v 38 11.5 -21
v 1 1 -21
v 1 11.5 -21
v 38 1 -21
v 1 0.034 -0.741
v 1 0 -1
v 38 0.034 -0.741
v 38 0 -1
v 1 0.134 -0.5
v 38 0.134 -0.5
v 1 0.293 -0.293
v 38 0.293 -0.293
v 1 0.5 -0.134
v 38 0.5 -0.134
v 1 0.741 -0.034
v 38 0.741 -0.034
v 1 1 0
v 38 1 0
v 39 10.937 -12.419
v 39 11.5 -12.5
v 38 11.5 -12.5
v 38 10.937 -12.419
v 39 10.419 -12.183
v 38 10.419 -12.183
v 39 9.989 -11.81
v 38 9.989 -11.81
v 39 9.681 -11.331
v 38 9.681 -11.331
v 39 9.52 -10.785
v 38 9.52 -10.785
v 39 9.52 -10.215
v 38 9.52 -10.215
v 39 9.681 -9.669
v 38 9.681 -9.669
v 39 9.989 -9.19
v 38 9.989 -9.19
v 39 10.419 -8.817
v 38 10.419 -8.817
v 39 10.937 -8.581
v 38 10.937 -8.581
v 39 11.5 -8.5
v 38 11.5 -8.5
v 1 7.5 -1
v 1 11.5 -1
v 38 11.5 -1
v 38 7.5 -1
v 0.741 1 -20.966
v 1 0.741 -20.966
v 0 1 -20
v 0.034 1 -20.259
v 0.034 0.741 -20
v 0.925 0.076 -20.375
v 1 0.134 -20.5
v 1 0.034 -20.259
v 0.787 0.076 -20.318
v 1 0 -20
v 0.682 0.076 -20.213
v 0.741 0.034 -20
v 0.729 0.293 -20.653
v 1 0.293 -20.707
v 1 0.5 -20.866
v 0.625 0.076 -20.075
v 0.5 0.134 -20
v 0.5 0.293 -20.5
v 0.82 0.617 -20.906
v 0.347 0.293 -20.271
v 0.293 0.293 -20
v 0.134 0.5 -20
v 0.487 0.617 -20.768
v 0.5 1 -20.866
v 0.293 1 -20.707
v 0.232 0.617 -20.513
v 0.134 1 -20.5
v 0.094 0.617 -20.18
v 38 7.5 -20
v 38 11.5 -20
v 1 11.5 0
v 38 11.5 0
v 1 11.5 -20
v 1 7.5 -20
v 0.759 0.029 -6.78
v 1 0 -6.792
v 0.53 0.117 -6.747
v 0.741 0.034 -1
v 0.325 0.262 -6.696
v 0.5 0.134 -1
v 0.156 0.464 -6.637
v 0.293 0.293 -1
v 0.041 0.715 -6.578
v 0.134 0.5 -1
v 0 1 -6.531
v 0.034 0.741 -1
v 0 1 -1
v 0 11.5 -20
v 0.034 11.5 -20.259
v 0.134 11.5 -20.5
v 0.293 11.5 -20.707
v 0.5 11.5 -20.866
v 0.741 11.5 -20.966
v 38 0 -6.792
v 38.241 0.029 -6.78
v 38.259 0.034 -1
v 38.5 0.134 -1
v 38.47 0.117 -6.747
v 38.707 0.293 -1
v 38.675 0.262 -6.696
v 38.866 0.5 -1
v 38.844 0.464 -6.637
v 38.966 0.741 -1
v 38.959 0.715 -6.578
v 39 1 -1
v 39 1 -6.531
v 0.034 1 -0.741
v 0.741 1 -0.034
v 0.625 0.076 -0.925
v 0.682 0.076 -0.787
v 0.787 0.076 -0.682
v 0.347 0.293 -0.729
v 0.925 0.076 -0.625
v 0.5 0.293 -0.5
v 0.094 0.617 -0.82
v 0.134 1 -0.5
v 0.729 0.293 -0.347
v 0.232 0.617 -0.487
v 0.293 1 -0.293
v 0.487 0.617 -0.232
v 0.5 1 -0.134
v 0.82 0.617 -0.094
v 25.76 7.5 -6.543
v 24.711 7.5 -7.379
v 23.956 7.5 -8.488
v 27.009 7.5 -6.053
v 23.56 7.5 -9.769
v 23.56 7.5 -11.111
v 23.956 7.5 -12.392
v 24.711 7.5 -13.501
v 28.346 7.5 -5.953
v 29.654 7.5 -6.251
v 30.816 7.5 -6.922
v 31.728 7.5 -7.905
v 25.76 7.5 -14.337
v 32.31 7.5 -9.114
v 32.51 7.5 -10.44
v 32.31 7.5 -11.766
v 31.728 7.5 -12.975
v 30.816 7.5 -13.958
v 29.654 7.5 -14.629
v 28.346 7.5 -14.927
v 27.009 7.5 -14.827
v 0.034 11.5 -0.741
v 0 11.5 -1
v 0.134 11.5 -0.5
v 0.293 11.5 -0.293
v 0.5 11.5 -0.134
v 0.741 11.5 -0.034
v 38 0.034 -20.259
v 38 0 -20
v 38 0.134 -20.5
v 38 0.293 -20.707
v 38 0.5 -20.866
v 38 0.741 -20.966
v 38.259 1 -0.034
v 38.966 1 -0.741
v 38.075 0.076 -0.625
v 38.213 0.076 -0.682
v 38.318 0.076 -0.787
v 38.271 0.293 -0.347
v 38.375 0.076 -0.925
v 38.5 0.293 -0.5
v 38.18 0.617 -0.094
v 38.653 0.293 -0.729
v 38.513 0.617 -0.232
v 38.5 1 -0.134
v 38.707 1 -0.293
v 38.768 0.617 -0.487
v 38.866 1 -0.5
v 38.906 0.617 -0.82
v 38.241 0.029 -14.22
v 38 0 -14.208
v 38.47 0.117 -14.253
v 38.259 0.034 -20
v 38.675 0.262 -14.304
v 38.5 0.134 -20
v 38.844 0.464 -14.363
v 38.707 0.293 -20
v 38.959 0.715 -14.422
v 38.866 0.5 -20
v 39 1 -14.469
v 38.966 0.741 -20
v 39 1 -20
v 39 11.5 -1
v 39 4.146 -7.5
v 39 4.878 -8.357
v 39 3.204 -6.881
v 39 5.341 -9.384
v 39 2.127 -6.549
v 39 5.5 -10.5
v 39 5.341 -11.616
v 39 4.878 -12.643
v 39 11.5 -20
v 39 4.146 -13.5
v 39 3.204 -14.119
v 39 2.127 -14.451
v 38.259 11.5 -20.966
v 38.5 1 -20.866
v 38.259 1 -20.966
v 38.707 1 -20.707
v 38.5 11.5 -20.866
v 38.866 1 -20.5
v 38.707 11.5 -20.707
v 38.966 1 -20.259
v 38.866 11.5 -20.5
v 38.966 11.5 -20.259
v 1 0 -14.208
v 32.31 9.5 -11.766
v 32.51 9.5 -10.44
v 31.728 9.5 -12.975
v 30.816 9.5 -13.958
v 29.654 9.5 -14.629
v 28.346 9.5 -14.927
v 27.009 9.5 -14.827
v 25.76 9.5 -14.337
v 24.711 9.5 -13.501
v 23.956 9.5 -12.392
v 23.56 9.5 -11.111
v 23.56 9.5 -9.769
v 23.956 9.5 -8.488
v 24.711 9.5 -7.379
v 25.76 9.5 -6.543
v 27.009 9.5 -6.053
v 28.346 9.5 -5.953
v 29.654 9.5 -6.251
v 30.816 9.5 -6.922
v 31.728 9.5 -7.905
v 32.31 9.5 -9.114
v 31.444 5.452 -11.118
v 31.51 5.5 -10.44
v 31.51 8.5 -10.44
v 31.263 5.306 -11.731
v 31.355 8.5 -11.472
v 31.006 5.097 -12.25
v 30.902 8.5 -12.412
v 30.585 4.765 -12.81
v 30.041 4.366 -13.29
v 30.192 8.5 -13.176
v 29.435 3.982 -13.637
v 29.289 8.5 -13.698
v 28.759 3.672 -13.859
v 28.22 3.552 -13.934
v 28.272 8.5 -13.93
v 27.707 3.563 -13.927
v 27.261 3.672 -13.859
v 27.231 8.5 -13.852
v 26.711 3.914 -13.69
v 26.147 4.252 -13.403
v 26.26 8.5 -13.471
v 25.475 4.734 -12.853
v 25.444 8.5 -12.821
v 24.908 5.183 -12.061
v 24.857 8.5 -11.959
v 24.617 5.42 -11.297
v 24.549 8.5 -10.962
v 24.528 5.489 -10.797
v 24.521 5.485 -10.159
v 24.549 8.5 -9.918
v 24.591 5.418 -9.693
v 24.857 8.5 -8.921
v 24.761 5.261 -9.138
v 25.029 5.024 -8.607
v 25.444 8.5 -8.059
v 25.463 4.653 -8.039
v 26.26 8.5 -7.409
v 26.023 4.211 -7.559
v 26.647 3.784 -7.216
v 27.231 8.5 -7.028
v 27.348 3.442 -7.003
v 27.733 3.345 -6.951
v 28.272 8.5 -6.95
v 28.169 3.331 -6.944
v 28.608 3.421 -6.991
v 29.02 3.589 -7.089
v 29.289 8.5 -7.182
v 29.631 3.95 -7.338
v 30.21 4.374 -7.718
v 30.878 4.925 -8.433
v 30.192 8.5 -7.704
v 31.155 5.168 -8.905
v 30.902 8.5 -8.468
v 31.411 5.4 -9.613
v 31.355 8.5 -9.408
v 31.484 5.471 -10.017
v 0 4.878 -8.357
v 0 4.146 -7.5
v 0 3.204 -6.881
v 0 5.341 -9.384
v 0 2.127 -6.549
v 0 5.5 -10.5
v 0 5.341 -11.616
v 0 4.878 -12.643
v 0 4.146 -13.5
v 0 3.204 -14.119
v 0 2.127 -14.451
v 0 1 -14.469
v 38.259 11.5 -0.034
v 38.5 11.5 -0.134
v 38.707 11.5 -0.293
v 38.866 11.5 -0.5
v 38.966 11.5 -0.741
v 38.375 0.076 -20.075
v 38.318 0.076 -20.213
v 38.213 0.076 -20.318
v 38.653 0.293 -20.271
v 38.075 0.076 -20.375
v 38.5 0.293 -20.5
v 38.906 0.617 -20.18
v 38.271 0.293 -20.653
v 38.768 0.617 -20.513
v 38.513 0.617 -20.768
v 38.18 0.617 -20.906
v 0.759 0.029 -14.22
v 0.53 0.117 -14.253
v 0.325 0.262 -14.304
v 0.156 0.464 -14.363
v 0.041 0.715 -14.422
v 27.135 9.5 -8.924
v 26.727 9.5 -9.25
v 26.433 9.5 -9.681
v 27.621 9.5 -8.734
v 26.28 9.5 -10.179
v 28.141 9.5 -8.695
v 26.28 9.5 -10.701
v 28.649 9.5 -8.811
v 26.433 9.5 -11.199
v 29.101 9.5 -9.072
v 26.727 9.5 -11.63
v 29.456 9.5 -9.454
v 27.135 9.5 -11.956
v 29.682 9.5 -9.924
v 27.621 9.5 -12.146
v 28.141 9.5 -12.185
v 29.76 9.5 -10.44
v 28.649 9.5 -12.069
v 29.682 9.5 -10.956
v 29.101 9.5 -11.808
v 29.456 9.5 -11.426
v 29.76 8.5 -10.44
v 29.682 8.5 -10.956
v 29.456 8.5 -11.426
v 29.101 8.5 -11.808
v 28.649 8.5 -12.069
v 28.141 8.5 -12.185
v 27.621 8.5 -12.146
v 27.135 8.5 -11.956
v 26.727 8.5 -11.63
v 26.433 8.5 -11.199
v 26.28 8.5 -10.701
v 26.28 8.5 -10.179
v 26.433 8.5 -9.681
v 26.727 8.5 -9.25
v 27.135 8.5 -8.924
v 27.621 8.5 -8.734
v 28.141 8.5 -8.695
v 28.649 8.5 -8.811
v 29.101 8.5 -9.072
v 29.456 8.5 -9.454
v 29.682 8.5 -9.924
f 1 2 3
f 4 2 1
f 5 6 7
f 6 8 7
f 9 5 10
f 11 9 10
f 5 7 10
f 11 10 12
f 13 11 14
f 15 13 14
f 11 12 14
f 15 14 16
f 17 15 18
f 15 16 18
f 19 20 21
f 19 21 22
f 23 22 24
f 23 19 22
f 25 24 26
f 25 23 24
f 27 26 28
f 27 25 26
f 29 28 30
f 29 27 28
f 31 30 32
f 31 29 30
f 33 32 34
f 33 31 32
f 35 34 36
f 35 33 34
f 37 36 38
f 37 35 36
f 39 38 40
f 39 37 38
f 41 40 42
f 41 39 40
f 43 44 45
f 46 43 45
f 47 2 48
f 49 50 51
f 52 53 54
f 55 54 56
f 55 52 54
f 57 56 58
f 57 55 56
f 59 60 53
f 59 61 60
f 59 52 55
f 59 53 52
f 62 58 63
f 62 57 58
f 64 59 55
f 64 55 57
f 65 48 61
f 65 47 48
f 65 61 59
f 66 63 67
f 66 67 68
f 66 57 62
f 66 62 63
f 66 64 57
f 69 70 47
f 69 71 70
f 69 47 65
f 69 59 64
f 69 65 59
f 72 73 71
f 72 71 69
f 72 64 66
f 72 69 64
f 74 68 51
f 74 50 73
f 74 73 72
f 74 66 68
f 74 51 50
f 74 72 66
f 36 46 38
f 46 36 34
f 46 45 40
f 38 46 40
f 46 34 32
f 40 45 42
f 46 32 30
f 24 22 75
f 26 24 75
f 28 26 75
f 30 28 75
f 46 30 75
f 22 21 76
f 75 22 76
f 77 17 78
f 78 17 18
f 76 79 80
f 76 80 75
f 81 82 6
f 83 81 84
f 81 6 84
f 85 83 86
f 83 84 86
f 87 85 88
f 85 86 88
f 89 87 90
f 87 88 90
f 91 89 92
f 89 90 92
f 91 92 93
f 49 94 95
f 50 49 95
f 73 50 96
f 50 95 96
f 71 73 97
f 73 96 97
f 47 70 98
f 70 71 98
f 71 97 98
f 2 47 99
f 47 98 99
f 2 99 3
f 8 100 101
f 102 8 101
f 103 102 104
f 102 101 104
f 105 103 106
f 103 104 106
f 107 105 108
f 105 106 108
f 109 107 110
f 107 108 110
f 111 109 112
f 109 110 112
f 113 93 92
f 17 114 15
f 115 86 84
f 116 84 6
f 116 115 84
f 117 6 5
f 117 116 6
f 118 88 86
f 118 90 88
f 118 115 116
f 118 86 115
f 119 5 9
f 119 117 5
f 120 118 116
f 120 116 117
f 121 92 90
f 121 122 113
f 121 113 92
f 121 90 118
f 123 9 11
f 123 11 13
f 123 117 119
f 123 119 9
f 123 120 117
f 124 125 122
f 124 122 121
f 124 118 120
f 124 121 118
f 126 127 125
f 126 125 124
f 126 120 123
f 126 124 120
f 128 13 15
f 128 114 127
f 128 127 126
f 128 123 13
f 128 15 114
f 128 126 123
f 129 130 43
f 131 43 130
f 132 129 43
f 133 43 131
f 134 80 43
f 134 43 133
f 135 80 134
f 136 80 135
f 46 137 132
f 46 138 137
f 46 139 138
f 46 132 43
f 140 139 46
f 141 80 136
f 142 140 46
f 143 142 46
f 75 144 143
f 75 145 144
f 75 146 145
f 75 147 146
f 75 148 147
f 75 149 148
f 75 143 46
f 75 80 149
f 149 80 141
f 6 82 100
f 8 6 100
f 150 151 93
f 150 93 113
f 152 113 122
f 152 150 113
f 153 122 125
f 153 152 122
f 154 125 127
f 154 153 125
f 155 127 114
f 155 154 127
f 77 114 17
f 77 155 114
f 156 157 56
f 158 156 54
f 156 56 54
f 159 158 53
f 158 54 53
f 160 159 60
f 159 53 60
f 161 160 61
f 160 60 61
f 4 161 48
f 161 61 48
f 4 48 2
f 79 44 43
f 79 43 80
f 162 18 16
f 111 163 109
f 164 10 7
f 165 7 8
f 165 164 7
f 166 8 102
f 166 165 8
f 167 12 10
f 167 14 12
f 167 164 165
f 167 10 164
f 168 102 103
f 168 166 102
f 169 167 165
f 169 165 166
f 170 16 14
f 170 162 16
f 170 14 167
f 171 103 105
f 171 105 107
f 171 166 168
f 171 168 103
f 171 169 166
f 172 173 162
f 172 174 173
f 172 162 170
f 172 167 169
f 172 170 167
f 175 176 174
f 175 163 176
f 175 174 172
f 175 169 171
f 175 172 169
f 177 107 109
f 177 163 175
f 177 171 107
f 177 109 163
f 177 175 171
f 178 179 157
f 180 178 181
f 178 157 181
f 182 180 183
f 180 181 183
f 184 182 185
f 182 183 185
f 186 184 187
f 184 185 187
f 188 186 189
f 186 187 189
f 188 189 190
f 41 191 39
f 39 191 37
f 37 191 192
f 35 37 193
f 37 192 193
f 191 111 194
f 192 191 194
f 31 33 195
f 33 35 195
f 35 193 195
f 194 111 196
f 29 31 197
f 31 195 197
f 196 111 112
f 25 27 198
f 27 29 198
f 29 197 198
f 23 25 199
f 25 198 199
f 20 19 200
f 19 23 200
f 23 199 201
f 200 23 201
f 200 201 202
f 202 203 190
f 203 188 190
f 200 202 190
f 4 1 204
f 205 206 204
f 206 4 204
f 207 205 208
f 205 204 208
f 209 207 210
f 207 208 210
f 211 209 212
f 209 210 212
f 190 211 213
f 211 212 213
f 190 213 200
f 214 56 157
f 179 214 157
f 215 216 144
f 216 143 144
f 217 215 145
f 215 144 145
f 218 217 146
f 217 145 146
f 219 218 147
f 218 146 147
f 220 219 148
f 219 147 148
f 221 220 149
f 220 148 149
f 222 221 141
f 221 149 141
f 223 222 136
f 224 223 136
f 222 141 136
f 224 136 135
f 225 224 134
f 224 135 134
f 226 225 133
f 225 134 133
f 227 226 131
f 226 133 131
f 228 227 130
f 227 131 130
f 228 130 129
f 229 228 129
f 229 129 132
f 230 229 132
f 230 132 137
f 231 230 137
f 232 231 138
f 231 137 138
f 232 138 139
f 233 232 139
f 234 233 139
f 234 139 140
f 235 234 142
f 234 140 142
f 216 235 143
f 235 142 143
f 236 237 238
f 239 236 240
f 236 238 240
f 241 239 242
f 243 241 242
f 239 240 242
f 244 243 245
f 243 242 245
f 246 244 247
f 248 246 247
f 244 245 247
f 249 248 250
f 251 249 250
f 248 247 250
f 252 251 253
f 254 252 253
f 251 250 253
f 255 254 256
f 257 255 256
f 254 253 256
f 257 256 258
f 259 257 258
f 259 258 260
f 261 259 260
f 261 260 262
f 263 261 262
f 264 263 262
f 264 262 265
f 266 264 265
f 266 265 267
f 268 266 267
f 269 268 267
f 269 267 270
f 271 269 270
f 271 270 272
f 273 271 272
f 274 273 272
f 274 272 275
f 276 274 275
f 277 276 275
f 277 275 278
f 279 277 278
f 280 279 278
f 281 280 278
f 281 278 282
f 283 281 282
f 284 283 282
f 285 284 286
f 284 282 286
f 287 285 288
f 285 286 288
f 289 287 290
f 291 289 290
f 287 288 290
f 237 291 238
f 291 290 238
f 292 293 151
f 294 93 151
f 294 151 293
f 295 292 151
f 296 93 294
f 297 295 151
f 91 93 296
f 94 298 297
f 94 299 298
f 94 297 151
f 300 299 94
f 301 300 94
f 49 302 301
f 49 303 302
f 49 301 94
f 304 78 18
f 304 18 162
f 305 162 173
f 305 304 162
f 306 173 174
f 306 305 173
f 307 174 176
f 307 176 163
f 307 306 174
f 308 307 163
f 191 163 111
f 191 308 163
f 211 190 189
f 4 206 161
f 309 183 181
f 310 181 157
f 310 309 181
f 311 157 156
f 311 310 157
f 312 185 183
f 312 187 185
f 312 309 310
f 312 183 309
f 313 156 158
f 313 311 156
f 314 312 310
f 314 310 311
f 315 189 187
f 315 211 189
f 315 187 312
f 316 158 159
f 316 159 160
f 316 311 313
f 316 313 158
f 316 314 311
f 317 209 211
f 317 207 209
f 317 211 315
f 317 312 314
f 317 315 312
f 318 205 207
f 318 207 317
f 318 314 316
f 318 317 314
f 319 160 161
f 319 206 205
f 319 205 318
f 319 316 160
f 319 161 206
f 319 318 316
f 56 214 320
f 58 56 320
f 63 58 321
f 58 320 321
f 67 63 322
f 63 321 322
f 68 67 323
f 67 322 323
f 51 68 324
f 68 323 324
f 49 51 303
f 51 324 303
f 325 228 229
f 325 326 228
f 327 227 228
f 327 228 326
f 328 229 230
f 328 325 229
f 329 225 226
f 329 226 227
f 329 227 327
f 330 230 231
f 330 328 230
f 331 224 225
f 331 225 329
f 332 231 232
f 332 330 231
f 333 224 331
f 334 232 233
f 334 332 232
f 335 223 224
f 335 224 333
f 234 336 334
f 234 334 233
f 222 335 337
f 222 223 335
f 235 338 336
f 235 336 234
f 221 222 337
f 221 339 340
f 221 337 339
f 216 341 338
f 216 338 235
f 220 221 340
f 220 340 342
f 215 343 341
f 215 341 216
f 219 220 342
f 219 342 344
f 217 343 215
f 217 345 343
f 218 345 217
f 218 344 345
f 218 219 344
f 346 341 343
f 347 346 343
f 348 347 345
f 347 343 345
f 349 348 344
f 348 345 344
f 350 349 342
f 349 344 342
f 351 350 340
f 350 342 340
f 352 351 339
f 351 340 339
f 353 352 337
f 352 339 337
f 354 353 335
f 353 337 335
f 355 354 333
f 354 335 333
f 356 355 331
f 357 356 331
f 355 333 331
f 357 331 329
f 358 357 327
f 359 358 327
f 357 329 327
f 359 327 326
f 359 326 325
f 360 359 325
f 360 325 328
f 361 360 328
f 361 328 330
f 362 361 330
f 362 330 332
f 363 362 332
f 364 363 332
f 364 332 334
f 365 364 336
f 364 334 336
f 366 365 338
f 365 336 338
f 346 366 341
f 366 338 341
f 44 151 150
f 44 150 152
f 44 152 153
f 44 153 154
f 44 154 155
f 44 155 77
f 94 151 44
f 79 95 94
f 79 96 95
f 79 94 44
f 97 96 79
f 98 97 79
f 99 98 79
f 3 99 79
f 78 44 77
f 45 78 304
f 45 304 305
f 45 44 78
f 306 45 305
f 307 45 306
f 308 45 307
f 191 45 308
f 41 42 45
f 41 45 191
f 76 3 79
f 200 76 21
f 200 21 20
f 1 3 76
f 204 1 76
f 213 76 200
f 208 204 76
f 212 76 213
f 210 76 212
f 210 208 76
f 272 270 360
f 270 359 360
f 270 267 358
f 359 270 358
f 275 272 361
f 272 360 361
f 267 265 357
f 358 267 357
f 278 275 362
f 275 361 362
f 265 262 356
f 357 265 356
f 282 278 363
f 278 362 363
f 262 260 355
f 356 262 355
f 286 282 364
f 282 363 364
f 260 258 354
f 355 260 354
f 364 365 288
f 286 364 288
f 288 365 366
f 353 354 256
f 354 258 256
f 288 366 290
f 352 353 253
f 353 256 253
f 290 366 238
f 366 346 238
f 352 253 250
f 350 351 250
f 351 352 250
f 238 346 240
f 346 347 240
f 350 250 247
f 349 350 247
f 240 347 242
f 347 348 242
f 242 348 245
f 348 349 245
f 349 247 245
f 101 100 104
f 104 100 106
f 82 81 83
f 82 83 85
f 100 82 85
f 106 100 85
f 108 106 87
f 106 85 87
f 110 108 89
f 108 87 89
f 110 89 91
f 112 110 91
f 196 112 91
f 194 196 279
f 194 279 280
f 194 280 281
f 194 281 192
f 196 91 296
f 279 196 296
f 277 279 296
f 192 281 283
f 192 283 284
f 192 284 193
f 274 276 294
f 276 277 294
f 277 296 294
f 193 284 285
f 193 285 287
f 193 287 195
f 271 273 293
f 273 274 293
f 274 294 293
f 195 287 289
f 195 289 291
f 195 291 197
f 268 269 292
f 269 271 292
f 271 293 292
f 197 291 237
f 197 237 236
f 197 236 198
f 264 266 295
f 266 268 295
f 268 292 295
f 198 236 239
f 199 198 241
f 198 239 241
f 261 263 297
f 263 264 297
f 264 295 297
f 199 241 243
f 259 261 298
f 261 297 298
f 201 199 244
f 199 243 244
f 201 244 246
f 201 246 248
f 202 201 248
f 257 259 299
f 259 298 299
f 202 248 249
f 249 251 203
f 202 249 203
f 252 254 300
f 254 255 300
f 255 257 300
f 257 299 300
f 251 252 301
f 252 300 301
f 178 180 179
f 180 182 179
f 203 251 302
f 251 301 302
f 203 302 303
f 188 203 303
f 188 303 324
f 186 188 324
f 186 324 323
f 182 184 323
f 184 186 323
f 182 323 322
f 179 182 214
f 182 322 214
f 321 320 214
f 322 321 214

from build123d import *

# Parameters (mm, degrees)
SKETCH1_W           = 39
SKETCH1_H           = 21
BOSS_EXTRUDE1_DEPTH = 11.5
SKETCH3_W           = 37
SKETCH3_H           = 19
CUT_EXTRUDE2_DEPTH  = 4
FILLET1_R           = 1
FILLET2_R           = 1
SKETCH5_R           = 4.5
BOSS_EXTRUDE2_DEPTH = 2
SKETCH6_R           = 3.5
CUT_EXTRUDE4_DEPTH  = 9.5
SKETCH7_R           = 4.5
BOSS_EXTRUDE3_DEPTH = 1
SKETCH8_R           = 1.75
CUT_EXTRUDE5_DEPTH  = 1
CUT_EXTRUDE6_DEPTH  = 1
CUT_EXTRUDE7_DEPTH  = 39


with BuildPart() as part:
    # Sketch1 → Boss-Extrude1 (new body)
    with BuildSketch(Plane(origin=(0, 0, 0), x_dir=(1, 0, 0), z_dir=(0, 1, 0))):
        with Locations((19.5, 10.5)):
            Rectangle(SKETCH1_W, SKETCH1_H)
    extrude(amount=BOSS_EXTRUDE1_DEPTH)

    # Sketch3 → Cut-Extrude2 (cut)
    with BuildSketch(Plane(origin=(0, 11.5, 0), x_dir=(1, 0, 0), z_dir=(0, 1, 0))):
        with Locations((19.5, 10.5)):
            Rectangle(SKETCH3_W, SKETCH3_H)
    extrude(amount=-CUT_EXTRUDE2_DEPTH, mode=Mode.SUBTRACT)

    # Fillet1
    fillet1_edges = [part.edges().sort_by_distance(p)[0] for p in [
        (0, 5.75, -21),
        (39, 5.75, -21),
        (39, 5.75, 0),
        (0, 5.75, 0),
    ]]
    fillet(fillet1_edges, radius=FILLET1_R)

    # Fillet2
    fillet2_edges = [part.edges().sort_by_distance(p)[0] for p in [
        (19.5, 0, 0),
        (0, 0, -10.5),
        (19.5, 0, -21),
        (39, 0, -10.5),
        (0.292893219, 0, -20.707106781),
        (38.707106781, 0, -20.707106781),
        (38.707106781, 0, -0.292893219),
        (0.292893219, 0, -0.292893219),
    ]]
    fillet(fillet2_edges, radius=FILLET2_R)

    # Sketch5 → Boss-Extrude2 (add)
    with BuildSketch(Plane(origin=(0, 7.5, 0), x_dir=(1, 0, 0), z_dir=(0, 1, 0))):
        with Locations((28.01, 10.44)):
            Circle(SKETCH5_R)
    extrude(amount=BOSS_EXTRUDE2_DEPTH)

    # Sketch6 → Cut-Extrude4 (cut)
    with BuildSketch(Plane(origin=(0, 9.5, 0), x_dir=(1, 0, 0), z_dir=(0, 1, 0))):
        with Locations((28.01, 10.44)):
            Circle(SKETCH6_R)
    extrude(amount=-CUT_EXTRUDE4_DEPTH, mode=Mode.SUBTRACT)

    # Sketch7 → Boss-Extrude3 (add)
    with BuildSketch(Plane(origin=(0, 9.5, 0), x_dir=(1, 0, 0), z_dir=(0, 1, 0))):
        with Locations((28.01, 10.44)):
            Circle(SKETCH7_R)
    extrude(amount=-BOSS_EXTRUDE3_DEPTH)

    # Sketch8 → Cut-Extrude5 (cut)
    with BuildSketch(Plane(origin=(0, 9.5, 0), x_dir=(1, 0, 0), z_dir=(0, 1, 0))):
        with Locations((28.01, 10.44)):
            Circle(SKETCH8_R)
    extrude(amount=-CUT_EXTRUDE5_DEPTH, mode=Mode.SUBTRACT)

    # Sketch9 → Cut-Extrude6 (cut)
    with BuildSketch(Plane(origin=(39, 0, 0), x_dir=(0, 0, -1), z_dir=(1, 0, 0))):
        with BuildLine():
            Line((8.5, 11.5), (12.5, 11.5))
            ThreePointArc((12.5, 11.5), (10.5, 9.5), (8.5, 11.5))
        make_face()
    extrude(amount=-CUT_EXTRUDE6_DEPTH, mode=Mode.SUBTRACT)

    # Sketch4 → Cut-Extrude7 (cut)
    with BuildSketch(Plane.ZY):
        with BuildLine():
            Line((-14.208099244, 0), (-6.791900756, 0))
            ThreePointArc((-6.791900756, 0), (-10.5, 5.5), (-14.208099244, 0))
        make_face()
    extrude(amount=-CUT_EXTRUDE7_DEPTH, mode=Mode.SUBTRACT)


solid = part.part
